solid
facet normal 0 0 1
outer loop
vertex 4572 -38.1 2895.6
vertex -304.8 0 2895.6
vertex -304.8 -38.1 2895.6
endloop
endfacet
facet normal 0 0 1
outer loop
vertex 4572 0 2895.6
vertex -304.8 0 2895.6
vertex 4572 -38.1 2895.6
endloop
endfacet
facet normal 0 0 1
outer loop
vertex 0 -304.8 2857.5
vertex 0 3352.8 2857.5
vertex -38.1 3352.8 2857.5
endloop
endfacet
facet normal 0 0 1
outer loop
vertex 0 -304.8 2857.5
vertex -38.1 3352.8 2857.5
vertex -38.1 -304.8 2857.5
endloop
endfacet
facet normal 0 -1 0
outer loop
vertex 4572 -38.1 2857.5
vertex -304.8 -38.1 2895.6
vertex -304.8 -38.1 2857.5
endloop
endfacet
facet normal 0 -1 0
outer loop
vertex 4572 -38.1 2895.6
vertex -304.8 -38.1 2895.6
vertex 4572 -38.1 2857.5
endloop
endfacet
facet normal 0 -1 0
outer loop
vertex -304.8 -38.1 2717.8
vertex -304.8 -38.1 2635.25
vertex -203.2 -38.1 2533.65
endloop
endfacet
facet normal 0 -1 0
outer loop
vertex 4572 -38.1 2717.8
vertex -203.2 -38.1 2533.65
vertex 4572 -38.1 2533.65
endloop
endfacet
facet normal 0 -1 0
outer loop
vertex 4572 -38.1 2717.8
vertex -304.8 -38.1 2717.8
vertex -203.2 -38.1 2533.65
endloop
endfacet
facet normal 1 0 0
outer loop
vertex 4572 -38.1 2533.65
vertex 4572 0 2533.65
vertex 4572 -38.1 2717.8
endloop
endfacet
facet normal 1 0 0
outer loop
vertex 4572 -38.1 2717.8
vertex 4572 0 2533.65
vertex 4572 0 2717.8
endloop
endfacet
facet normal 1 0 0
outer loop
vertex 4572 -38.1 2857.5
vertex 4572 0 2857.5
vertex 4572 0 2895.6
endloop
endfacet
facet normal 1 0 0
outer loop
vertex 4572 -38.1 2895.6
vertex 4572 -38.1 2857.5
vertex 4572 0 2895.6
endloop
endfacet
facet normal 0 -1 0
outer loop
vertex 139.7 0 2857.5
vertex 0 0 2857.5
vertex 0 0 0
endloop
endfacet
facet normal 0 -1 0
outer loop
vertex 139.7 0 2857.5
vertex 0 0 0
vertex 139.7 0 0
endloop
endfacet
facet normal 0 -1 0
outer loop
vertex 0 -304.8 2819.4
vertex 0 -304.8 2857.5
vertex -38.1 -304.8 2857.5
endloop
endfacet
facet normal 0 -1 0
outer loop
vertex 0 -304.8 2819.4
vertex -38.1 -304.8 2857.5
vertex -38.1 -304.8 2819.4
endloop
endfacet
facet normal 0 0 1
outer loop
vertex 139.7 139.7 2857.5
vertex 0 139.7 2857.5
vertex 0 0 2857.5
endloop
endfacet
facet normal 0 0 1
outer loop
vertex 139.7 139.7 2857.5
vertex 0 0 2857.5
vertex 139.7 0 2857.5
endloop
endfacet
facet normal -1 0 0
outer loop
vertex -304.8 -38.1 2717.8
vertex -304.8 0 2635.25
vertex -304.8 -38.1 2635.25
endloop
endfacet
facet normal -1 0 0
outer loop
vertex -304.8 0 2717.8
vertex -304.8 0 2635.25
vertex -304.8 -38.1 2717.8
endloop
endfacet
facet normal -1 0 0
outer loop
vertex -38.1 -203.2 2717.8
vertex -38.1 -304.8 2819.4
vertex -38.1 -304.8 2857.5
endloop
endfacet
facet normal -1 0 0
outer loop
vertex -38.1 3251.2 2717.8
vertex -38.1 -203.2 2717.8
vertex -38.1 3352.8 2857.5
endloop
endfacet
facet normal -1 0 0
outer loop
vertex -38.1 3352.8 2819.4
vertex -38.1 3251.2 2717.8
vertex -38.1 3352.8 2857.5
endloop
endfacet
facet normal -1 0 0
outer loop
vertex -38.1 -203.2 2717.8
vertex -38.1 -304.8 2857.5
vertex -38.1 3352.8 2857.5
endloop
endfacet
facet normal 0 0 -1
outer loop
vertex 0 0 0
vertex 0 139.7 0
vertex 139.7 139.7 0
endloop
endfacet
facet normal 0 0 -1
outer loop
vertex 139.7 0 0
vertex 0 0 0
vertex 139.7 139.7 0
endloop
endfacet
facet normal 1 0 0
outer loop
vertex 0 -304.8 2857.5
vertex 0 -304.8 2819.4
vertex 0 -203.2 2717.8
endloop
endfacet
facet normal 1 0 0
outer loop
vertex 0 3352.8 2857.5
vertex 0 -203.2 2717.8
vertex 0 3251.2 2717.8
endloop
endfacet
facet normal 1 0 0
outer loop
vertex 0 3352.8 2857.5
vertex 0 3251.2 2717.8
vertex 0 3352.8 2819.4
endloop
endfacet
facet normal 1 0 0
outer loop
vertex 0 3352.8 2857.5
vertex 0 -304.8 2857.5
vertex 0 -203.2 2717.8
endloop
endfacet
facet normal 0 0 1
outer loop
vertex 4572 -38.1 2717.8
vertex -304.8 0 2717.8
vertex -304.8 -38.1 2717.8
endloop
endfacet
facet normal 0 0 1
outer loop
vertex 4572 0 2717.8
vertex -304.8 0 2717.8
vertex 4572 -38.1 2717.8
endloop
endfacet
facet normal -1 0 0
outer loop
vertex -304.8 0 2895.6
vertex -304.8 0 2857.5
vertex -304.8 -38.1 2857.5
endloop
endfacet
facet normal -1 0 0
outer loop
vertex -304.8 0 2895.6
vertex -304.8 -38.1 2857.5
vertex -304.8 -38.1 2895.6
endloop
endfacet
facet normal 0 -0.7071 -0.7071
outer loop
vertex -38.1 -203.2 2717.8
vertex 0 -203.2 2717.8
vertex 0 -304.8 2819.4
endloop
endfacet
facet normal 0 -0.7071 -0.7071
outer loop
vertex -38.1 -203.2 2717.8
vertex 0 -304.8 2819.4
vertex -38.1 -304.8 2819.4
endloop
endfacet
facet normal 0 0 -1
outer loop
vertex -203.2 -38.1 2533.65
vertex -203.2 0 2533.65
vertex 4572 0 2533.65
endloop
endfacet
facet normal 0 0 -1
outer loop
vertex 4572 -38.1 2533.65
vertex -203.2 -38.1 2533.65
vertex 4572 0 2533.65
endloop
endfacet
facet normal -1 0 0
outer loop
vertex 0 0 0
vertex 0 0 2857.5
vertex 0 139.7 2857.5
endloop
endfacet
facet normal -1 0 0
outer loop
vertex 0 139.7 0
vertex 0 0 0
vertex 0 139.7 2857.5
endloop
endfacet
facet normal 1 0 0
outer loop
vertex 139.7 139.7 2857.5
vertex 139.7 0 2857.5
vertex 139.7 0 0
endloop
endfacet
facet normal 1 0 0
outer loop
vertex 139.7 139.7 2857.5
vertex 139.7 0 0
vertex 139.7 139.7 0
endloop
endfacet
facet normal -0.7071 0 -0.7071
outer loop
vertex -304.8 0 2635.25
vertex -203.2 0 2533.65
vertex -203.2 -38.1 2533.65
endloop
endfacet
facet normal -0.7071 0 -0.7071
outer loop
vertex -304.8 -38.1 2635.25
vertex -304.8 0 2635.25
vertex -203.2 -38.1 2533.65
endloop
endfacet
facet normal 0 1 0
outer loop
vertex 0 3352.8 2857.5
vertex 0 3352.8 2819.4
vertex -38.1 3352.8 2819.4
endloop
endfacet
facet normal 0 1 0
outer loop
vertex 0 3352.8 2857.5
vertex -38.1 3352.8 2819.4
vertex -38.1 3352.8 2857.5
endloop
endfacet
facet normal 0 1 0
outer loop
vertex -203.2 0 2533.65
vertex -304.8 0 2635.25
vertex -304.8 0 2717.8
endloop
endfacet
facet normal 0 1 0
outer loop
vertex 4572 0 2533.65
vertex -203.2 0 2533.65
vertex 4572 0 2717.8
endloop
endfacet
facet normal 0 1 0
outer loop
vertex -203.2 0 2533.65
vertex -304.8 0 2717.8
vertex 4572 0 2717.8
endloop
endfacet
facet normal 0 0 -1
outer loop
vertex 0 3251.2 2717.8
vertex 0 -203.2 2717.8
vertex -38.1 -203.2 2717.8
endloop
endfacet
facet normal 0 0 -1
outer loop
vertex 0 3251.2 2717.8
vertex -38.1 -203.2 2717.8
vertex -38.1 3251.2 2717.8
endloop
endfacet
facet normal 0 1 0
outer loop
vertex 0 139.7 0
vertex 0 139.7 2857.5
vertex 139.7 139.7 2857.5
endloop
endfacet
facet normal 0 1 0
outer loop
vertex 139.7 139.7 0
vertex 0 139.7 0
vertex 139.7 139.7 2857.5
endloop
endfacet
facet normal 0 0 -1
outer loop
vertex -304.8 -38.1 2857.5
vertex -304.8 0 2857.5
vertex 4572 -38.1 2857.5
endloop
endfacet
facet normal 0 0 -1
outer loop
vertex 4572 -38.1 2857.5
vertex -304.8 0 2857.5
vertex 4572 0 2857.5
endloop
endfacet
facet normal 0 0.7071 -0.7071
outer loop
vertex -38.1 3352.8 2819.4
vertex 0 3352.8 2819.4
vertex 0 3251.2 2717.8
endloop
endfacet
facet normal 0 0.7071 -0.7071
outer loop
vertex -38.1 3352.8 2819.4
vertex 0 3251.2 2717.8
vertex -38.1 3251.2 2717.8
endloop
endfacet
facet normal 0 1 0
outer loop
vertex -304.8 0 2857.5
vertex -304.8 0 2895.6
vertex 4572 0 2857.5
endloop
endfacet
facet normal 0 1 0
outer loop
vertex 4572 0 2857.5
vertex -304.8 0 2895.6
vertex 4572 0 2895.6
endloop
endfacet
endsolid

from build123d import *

# Parameters (mm, degrees)
F0_W     = 139.7
F0_H     = 139.7
F1_DEPTH = 2857.5
F2_W     = 4876.8
F2_H     = 184.15
F3_DEPTH = 38.1
F4_SIZE  = 101.6
F6_DEPTH = 38.1
F7_SIZE  = 101.6
F8_W     = 4876.8
F8_H     = 38.1
F9_DEPTH = 38.1


with BuildPart() as f1:
    # F0 (on Top) → F1 (new body)
    with BuildSketch(Plane.XY):
        with Locations((69.85, 69.85)):
            Rectangle(F0_W, F0_H)
    extrude(amount=F1_DEPTH)


with BuildPart() as f3:
    # F2 (on face) → F3 (new body)
    with BuildSketch(Plane.XZ):
        with Locations((2133.6, 2625.725)):
            Rectangle(F2_W, F2_H)
    extrude(amount=F3_DEPTH)

    # F4
    f4_edges = [f3.edges().sort_by_distance(p)[0] for p in [
        (-304.8, -19.05, 2533.65),
    ]]
    chamfer(f4_edges, length=F4_SIZE)


with BuildPart() as f6:
    # F5 (on Right) → F6 (new body)
    with BuildSketch(Plane.YZ):
        Polygon((3352.8, 2857.5), (-304.8, 2857.5), (-304.8, 2717.8), (-38.1, 2717.8), (0, 2717.8), (3352.8, 2717.8), align=None)
    extrude(amount=-F6_DEPTH)

    # F7
    f7_edges = [f6.edges().sort_by_distance(p)[0] for p in [
        (-19.05, -304.8, 2717.8),
        (-19.05, 3352.8, 2717.8),
    ]]
    chamfer(f7_edges, length=F7_SIZE)


with BuildPart() as f9:
    # F8 (on Front) → F9 (new body)
    with BuildSketch(Plane.XZ):
        with Locations((2133.6, 2876.55)):
            Rectangle(F8_W, F8_H)
    extrude(amount=F9_DEPTH)


solid = Compound([f1.part, f3.part, f6.part, f9.part])
